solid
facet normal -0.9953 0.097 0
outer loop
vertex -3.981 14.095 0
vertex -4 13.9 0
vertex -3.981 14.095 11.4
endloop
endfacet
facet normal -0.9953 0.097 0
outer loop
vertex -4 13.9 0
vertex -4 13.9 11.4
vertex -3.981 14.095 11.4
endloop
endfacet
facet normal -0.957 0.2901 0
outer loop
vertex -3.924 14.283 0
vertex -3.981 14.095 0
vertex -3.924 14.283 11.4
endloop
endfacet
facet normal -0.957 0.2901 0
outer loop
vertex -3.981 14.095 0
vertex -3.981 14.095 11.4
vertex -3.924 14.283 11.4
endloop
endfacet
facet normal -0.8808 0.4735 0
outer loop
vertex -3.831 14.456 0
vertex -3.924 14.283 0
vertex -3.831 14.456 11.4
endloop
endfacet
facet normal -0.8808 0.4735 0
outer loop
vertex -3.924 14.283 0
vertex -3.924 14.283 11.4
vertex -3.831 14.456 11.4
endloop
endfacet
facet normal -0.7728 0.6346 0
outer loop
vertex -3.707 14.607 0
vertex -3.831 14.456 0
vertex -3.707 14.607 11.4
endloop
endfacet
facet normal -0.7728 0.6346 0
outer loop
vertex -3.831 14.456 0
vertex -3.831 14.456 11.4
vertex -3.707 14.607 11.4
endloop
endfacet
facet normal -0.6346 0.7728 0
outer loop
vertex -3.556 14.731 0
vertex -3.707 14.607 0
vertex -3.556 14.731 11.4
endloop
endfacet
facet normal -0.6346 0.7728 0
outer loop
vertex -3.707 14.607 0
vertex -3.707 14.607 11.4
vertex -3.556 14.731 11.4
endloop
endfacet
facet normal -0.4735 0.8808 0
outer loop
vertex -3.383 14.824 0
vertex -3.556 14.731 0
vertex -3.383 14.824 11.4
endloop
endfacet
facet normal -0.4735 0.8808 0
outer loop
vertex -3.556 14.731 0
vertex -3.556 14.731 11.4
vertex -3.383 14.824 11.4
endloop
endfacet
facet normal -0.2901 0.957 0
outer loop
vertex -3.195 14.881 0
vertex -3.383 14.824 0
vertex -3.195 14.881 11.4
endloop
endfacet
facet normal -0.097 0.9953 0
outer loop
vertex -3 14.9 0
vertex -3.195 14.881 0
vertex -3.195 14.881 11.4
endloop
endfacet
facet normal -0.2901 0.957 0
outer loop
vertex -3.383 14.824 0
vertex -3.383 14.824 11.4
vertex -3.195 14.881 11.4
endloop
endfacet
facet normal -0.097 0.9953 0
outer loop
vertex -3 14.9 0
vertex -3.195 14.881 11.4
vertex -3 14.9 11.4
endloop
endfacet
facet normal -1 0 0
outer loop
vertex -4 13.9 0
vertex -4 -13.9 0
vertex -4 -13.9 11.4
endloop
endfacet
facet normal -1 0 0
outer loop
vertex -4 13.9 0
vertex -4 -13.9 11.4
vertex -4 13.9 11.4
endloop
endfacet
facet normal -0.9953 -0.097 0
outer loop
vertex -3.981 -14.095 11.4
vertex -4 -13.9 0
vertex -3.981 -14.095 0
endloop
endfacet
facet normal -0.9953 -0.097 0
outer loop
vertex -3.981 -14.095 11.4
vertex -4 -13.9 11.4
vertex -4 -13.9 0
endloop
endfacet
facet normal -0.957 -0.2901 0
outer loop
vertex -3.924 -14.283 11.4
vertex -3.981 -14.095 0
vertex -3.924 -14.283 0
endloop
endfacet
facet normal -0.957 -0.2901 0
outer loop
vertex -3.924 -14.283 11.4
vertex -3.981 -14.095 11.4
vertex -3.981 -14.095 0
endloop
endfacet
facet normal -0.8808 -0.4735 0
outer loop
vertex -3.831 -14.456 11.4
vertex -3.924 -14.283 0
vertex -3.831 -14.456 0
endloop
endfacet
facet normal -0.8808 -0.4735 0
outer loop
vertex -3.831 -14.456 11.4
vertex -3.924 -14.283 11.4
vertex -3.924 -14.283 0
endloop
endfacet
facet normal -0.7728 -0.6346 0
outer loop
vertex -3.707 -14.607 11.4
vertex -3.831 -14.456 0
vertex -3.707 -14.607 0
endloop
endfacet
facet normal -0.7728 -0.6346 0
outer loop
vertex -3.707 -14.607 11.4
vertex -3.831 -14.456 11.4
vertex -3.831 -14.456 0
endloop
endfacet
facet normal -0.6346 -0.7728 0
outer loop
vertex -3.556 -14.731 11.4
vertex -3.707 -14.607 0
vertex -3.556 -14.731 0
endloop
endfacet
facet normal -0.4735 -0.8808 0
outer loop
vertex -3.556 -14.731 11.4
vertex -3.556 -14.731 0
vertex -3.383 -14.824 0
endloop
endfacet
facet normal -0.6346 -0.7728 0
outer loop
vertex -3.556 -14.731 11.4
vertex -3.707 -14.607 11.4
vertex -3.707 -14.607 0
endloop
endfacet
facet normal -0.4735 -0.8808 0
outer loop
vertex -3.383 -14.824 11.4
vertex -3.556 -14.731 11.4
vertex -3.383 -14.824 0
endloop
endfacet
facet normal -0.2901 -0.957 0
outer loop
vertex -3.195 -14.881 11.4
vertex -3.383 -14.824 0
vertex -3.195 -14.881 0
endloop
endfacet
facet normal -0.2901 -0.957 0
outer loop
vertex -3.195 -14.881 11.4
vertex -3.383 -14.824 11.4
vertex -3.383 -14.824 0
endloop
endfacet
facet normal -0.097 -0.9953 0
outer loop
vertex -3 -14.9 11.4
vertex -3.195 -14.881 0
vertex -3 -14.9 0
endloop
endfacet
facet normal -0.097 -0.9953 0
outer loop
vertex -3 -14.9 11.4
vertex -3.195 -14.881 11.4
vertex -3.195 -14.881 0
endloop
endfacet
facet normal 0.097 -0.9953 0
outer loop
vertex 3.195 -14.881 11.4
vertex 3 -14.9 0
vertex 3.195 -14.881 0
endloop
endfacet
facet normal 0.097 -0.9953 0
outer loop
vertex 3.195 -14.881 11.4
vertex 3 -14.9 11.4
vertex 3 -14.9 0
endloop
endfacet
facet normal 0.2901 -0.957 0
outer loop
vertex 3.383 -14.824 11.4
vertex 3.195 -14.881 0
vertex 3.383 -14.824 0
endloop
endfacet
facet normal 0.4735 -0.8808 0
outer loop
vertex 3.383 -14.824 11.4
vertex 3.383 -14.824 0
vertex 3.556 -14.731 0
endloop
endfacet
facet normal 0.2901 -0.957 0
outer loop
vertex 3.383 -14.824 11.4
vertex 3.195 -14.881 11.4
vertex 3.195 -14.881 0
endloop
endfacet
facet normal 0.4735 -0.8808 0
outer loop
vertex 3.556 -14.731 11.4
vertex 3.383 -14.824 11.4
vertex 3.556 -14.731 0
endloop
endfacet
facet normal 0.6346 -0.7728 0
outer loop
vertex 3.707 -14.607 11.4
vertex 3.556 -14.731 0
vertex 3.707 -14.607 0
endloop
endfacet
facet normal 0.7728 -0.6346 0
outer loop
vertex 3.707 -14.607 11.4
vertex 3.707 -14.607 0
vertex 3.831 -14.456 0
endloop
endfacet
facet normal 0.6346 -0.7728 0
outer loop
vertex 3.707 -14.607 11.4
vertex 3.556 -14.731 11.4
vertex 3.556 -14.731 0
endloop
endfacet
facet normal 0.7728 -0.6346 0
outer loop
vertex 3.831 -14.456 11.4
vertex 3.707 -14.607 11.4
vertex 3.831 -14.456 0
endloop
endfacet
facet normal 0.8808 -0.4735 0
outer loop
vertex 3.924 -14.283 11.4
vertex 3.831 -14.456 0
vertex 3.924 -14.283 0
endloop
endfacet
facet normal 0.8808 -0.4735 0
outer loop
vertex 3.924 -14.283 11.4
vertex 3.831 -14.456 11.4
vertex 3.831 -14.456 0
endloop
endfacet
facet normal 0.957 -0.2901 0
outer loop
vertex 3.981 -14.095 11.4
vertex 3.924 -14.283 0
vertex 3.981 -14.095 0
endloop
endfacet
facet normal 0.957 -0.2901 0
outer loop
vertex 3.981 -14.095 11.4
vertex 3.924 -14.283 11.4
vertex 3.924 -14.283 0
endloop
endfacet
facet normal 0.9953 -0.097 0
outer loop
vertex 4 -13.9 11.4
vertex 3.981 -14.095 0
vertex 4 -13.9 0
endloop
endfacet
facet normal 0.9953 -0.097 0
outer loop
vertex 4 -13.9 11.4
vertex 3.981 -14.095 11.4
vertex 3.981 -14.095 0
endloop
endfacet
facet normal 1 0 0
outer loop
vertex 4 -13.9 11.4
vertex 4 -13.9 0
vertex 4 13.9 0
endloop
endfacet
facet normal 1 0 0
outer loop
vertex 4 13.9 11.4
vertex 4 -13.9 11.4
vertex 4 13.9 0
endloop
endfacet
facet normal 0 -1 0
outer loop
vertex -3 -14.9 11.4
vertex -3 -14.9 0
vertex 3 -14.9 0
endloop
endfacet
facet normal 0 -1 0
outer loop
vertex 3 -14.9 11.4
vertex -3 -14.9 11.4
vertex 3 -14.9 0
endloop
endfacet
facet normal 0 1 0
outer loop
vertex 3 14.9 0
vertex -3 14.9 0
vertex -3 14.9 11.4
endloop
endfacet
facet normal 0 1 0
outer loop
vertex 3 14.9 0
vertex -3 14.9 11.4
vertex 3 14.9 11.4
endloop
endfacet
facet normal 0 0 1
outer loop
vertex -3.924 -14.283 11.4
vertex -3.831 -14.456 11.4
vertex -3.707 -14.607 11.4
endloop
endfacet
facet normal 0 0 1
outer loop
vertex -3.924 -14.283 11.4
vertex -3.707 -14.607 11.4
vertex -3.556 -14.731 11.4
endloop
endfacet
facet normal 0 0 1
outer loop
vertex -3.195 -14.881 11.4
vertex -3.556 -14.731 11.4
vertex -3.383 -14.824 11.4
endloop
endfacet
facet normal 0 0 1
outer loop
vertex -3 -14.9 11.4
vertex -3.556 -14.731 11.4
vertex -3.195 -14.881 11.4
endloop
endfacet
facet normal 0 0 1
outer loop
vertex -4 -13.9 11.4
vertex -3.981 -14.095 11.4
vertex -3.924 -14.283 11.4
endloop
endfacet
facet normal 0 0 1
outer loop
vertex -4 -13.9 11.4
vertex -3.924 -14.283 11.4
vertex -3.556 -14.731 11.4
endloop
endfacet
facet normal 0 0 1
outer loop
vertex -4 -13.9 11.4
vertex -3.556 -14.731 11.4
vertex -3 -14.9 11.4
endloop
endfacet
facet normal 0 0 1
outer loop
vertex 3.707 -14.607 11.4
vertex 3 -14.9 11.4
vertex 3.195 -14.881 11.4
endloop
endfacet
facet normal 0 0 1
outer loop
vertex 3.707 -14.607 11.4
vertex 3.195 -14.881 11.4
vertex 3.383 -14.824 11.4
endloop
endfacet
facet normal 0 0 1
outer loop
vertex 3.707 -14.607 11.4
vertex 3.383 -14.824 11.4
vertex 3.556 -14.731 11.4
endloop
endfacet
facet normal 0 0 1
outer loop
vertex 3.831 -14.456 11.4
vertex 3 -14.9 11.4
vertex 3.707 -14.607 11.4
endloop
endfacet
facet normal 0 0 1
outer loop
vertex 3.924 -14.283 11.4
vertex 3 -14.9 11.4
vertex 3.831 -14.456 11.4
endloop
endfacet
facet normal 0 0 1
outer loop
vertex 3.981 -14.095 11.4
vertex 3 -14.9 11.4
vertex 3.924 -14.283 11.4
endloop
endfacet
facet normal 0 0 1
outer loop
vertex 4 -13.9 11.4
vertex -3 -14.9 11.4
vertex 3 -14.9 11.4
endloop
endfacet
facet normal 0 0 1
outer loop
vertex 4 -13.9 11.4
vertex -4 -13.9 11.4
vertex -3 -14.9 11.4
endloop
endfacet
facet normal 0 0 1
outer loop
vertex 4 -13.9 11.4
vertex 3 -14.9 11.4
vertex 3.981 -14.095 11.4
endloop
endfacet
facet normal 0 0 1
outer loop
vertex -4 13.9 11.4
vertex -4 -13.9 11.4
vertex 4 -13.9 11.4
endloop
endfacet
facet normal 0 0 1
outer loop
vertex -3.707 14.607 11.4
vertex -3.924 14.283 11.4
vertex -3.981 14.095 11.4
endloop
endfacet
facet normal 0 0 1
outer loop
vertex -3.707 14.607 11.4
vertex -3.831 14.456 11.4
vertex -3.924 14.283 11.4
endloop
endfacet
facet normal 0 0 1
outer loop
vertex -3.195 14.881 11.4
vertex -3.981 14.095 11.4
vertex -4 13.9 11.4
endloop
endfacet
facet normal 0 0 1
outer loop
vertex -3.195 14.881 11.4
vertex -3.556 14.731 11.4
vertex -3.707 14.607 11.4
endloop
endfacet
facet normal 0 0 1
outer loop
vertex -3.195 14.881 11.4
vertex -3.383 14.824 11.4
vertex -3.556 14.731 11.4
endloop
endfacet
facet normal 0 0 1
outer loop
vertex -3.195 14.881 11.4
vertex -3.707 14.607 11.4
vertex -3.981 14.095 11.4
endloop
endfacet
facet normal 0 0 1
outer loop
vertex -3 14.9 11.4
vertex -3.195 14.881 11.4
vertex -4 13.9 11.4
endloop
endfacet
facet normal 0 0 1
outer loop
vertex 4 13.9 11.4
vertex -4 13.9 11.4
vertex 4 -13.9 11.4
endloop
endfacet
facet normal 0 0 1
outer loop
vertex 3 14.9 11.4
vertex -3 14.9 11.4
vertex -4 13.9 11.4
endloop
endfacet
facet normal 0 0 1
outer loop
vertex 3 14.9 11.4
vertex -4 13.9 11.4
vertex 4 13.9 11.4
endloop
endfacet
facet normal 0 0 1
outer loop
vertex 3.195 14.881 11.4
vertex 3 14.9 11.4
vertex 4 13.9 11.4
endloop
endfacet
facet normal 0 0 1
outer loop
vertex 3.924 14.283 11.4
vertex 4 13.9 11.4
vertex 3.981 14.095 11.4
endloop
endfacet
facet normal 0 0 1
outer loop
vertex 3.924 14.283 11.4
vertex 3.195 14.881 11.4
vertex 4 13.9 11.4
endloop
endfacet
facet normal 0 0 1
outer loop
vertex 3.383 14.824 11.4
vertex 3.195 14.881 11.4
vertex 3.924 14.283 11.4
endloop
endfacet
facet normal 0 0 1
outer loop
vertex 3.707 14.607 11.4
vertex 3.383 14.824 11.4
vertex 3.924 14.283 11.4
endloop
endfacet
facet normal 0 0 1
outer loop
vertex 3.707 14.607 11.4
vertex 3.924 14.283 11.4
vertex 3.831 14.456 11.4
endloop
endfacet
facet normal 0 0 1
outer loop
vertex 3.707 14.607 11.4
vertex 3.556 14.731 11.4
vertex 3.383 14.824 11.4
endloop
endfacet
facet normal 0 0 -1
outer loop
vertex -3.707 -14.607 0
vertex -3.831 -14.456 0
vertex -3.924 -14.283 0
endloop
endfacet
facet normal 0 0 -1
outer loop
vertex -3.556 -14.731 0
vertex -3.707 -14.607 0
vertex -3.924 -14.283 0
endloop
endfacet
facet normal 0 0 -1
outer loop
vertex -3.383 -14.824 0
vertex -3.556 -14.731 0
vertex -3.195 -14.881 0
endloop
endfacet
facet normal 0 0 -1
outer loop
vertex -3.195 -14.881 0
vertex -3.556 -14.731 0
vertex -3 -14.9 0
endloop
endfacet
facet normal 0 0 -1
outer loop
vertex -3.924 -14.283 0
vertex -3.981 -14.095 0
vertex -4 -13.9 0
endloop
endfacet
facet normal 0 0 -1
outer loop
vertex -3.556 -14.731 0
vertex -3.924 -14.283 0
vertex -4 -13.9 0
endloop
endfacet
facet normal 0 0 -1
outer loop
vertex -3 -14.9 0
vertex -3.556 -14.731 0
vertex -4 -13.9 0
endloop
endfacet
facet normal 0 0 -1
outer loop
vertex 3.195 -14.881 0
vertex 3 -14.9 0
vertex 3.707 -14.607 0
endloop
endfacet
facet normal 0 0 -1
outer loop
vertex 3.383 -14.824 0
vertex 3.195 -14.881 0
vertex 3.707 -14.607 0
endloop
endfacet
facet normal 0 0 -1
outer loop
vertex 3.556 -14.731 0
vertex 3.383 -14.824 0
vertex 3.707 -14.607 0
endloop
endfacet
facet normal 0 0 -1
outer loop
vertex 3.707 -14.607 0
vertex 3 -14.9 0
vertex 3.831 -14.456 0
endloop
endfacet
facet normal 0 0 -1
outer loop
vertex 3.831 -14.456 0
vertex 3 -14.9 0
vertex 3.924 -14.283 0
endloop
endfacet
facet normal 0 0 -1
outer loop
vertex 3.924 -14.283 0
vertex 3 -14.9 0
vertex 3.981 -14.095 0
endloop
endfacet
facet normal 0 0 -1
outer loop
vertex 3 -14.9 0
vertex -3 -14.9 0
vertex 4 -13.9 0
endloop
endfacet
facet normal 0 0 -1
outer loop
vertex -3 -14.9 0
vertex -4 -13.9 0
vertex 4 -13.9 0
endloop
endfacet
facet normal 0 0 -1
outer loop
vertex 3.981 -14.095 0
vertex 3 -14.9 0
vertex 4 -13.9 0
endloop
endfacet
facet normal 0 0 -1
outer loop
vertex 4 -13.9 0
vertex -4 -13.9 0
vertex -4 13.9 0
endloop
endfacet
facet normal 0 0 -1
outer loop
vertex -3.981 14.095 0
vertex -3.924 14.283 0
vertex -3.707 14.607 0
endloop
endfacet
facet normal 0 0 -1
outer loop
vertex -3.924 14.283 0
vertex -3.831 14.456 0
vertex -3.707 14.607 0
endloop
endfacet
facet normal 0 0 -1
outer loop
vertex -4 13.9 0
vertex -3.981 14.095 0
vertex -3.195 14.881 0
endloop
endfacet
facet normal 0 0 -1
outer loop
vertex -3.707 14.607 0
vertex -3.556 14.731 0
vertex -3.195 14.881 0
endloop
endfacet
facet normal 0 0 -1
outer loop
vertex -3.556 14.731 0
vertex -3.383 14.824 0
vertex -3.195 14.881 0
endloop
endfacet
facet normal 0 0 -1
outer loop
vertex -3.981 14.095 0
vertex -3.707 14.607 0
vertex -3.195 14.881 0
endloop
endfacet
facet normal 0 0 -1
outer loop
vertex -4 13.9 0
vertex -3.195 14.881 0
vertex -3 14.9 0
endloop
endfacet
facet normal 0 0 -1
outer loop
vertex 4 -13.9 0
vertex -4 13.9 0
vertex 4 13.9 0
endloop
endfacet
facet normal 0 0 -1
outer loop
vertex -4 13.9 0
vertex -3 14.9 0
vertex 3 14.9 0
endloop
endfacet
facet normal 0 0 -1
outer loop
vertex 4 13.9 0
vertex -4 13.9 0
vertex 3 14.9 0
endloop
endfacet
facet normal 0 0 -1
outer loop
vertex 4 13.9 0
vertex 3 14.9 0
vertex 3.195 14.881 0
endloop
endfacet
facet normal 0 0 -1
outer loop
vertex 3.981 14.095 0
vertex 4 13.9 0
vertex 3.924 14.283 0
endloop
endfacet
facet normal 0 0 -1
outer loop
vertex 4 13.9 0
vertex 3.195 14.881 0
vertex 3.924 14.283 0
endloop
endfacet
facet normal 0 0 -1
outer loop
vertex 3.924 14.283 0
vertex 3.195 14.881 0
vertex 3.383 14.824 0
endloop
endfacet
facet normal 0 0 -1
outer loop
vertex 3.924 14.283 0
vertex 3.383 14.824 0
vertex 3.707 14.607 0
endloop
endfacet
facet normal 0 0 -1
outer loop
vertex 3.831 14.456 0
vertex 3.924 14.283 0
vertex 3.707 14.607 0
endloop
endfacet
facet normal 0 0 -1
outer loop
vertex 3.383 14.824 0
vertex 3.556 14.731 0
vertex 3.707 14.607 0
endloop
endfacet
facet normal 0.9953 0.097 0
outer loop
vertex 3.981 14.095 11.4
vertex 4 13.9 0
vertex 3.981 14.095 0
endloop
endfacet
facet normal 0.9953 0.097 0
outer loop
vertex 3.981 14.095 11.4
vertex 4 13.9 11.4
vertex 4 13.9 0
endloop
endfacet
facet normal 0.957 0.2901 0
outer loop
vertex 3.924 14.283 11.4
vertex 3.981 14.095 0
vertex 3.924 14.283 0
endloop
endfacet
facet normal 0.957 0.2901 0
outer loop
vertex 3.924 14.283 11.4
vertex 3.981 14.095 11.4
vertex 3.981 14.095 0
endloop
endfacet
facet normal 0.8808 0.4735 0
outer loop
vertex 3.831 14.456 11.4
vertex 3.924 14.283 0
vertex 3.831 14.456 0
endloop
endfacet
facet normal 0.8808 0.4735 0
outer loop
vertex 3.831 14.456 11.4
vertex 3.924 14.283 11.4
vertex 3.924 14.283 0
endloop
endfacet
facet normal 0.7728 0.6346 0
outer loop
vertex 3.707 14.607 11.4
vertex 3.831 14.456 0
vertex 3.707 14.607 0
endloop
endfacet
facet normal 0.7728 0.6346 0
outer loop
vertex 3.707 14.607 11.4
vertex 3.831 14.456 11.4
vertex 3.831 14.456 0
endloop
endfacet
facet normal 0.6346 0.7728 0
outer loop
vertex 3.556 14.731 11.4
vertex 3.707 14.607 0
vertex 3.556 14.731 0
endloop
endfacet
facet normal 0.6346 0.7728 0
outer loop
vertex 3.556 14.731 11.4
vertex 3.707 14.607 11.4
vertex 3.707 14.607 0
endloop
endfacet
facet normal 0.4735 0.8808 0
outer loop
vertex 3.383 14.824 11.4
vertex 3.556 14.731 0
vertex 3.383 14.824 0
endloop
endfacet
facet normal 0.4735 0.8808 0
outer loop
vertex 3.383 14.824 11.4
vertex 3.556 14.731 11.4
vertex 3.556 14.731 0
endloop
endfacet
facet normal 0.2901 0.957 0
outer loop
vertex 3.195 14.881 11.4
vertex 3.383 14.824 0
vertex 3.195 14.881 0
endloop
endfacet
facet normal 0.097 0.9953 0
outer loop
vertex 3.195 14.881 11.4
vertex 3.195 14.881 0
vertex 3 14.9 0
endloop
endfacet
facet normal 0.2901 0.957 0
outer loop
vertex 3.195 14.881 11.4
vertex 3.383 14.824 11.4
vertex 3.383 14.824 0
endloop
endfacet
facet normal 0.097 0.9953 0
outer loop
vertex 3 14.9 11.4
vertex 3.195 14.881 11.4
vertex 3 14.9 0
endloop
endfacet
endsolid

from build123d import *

# Parameters (mm, degrees)
CROQUIS1_W              = 8
CROQUIS1_H              = 29.8
SALIENTE_EXTRUIR1_DEPTH = 11.4
REDONDEO2_R             = 1


with BuildPart() as part:
    # Croquis1 → Saliente-Extruir1 (new body)
    with BuildSketch(Plane.XY):
        Rectangle(CROQUIS1_W, CROQUIS1_H)
    extrude(amount=SALIENTE_EXTRUIR1_DEPTH)

    # Redondeo2
    redondeo2_edges = [part.edges().sort_by_distance(p)[0] for p in [
        (4, -14.9, 5.7),
        (-4, -14.9, 5.7),
        (-4, 14.9, 5.7),
        (4, 14.9, 5.7),
    ]]
    fillet(redondeo2_edges, radius=REDONDEO2_R)


solid = part.part
